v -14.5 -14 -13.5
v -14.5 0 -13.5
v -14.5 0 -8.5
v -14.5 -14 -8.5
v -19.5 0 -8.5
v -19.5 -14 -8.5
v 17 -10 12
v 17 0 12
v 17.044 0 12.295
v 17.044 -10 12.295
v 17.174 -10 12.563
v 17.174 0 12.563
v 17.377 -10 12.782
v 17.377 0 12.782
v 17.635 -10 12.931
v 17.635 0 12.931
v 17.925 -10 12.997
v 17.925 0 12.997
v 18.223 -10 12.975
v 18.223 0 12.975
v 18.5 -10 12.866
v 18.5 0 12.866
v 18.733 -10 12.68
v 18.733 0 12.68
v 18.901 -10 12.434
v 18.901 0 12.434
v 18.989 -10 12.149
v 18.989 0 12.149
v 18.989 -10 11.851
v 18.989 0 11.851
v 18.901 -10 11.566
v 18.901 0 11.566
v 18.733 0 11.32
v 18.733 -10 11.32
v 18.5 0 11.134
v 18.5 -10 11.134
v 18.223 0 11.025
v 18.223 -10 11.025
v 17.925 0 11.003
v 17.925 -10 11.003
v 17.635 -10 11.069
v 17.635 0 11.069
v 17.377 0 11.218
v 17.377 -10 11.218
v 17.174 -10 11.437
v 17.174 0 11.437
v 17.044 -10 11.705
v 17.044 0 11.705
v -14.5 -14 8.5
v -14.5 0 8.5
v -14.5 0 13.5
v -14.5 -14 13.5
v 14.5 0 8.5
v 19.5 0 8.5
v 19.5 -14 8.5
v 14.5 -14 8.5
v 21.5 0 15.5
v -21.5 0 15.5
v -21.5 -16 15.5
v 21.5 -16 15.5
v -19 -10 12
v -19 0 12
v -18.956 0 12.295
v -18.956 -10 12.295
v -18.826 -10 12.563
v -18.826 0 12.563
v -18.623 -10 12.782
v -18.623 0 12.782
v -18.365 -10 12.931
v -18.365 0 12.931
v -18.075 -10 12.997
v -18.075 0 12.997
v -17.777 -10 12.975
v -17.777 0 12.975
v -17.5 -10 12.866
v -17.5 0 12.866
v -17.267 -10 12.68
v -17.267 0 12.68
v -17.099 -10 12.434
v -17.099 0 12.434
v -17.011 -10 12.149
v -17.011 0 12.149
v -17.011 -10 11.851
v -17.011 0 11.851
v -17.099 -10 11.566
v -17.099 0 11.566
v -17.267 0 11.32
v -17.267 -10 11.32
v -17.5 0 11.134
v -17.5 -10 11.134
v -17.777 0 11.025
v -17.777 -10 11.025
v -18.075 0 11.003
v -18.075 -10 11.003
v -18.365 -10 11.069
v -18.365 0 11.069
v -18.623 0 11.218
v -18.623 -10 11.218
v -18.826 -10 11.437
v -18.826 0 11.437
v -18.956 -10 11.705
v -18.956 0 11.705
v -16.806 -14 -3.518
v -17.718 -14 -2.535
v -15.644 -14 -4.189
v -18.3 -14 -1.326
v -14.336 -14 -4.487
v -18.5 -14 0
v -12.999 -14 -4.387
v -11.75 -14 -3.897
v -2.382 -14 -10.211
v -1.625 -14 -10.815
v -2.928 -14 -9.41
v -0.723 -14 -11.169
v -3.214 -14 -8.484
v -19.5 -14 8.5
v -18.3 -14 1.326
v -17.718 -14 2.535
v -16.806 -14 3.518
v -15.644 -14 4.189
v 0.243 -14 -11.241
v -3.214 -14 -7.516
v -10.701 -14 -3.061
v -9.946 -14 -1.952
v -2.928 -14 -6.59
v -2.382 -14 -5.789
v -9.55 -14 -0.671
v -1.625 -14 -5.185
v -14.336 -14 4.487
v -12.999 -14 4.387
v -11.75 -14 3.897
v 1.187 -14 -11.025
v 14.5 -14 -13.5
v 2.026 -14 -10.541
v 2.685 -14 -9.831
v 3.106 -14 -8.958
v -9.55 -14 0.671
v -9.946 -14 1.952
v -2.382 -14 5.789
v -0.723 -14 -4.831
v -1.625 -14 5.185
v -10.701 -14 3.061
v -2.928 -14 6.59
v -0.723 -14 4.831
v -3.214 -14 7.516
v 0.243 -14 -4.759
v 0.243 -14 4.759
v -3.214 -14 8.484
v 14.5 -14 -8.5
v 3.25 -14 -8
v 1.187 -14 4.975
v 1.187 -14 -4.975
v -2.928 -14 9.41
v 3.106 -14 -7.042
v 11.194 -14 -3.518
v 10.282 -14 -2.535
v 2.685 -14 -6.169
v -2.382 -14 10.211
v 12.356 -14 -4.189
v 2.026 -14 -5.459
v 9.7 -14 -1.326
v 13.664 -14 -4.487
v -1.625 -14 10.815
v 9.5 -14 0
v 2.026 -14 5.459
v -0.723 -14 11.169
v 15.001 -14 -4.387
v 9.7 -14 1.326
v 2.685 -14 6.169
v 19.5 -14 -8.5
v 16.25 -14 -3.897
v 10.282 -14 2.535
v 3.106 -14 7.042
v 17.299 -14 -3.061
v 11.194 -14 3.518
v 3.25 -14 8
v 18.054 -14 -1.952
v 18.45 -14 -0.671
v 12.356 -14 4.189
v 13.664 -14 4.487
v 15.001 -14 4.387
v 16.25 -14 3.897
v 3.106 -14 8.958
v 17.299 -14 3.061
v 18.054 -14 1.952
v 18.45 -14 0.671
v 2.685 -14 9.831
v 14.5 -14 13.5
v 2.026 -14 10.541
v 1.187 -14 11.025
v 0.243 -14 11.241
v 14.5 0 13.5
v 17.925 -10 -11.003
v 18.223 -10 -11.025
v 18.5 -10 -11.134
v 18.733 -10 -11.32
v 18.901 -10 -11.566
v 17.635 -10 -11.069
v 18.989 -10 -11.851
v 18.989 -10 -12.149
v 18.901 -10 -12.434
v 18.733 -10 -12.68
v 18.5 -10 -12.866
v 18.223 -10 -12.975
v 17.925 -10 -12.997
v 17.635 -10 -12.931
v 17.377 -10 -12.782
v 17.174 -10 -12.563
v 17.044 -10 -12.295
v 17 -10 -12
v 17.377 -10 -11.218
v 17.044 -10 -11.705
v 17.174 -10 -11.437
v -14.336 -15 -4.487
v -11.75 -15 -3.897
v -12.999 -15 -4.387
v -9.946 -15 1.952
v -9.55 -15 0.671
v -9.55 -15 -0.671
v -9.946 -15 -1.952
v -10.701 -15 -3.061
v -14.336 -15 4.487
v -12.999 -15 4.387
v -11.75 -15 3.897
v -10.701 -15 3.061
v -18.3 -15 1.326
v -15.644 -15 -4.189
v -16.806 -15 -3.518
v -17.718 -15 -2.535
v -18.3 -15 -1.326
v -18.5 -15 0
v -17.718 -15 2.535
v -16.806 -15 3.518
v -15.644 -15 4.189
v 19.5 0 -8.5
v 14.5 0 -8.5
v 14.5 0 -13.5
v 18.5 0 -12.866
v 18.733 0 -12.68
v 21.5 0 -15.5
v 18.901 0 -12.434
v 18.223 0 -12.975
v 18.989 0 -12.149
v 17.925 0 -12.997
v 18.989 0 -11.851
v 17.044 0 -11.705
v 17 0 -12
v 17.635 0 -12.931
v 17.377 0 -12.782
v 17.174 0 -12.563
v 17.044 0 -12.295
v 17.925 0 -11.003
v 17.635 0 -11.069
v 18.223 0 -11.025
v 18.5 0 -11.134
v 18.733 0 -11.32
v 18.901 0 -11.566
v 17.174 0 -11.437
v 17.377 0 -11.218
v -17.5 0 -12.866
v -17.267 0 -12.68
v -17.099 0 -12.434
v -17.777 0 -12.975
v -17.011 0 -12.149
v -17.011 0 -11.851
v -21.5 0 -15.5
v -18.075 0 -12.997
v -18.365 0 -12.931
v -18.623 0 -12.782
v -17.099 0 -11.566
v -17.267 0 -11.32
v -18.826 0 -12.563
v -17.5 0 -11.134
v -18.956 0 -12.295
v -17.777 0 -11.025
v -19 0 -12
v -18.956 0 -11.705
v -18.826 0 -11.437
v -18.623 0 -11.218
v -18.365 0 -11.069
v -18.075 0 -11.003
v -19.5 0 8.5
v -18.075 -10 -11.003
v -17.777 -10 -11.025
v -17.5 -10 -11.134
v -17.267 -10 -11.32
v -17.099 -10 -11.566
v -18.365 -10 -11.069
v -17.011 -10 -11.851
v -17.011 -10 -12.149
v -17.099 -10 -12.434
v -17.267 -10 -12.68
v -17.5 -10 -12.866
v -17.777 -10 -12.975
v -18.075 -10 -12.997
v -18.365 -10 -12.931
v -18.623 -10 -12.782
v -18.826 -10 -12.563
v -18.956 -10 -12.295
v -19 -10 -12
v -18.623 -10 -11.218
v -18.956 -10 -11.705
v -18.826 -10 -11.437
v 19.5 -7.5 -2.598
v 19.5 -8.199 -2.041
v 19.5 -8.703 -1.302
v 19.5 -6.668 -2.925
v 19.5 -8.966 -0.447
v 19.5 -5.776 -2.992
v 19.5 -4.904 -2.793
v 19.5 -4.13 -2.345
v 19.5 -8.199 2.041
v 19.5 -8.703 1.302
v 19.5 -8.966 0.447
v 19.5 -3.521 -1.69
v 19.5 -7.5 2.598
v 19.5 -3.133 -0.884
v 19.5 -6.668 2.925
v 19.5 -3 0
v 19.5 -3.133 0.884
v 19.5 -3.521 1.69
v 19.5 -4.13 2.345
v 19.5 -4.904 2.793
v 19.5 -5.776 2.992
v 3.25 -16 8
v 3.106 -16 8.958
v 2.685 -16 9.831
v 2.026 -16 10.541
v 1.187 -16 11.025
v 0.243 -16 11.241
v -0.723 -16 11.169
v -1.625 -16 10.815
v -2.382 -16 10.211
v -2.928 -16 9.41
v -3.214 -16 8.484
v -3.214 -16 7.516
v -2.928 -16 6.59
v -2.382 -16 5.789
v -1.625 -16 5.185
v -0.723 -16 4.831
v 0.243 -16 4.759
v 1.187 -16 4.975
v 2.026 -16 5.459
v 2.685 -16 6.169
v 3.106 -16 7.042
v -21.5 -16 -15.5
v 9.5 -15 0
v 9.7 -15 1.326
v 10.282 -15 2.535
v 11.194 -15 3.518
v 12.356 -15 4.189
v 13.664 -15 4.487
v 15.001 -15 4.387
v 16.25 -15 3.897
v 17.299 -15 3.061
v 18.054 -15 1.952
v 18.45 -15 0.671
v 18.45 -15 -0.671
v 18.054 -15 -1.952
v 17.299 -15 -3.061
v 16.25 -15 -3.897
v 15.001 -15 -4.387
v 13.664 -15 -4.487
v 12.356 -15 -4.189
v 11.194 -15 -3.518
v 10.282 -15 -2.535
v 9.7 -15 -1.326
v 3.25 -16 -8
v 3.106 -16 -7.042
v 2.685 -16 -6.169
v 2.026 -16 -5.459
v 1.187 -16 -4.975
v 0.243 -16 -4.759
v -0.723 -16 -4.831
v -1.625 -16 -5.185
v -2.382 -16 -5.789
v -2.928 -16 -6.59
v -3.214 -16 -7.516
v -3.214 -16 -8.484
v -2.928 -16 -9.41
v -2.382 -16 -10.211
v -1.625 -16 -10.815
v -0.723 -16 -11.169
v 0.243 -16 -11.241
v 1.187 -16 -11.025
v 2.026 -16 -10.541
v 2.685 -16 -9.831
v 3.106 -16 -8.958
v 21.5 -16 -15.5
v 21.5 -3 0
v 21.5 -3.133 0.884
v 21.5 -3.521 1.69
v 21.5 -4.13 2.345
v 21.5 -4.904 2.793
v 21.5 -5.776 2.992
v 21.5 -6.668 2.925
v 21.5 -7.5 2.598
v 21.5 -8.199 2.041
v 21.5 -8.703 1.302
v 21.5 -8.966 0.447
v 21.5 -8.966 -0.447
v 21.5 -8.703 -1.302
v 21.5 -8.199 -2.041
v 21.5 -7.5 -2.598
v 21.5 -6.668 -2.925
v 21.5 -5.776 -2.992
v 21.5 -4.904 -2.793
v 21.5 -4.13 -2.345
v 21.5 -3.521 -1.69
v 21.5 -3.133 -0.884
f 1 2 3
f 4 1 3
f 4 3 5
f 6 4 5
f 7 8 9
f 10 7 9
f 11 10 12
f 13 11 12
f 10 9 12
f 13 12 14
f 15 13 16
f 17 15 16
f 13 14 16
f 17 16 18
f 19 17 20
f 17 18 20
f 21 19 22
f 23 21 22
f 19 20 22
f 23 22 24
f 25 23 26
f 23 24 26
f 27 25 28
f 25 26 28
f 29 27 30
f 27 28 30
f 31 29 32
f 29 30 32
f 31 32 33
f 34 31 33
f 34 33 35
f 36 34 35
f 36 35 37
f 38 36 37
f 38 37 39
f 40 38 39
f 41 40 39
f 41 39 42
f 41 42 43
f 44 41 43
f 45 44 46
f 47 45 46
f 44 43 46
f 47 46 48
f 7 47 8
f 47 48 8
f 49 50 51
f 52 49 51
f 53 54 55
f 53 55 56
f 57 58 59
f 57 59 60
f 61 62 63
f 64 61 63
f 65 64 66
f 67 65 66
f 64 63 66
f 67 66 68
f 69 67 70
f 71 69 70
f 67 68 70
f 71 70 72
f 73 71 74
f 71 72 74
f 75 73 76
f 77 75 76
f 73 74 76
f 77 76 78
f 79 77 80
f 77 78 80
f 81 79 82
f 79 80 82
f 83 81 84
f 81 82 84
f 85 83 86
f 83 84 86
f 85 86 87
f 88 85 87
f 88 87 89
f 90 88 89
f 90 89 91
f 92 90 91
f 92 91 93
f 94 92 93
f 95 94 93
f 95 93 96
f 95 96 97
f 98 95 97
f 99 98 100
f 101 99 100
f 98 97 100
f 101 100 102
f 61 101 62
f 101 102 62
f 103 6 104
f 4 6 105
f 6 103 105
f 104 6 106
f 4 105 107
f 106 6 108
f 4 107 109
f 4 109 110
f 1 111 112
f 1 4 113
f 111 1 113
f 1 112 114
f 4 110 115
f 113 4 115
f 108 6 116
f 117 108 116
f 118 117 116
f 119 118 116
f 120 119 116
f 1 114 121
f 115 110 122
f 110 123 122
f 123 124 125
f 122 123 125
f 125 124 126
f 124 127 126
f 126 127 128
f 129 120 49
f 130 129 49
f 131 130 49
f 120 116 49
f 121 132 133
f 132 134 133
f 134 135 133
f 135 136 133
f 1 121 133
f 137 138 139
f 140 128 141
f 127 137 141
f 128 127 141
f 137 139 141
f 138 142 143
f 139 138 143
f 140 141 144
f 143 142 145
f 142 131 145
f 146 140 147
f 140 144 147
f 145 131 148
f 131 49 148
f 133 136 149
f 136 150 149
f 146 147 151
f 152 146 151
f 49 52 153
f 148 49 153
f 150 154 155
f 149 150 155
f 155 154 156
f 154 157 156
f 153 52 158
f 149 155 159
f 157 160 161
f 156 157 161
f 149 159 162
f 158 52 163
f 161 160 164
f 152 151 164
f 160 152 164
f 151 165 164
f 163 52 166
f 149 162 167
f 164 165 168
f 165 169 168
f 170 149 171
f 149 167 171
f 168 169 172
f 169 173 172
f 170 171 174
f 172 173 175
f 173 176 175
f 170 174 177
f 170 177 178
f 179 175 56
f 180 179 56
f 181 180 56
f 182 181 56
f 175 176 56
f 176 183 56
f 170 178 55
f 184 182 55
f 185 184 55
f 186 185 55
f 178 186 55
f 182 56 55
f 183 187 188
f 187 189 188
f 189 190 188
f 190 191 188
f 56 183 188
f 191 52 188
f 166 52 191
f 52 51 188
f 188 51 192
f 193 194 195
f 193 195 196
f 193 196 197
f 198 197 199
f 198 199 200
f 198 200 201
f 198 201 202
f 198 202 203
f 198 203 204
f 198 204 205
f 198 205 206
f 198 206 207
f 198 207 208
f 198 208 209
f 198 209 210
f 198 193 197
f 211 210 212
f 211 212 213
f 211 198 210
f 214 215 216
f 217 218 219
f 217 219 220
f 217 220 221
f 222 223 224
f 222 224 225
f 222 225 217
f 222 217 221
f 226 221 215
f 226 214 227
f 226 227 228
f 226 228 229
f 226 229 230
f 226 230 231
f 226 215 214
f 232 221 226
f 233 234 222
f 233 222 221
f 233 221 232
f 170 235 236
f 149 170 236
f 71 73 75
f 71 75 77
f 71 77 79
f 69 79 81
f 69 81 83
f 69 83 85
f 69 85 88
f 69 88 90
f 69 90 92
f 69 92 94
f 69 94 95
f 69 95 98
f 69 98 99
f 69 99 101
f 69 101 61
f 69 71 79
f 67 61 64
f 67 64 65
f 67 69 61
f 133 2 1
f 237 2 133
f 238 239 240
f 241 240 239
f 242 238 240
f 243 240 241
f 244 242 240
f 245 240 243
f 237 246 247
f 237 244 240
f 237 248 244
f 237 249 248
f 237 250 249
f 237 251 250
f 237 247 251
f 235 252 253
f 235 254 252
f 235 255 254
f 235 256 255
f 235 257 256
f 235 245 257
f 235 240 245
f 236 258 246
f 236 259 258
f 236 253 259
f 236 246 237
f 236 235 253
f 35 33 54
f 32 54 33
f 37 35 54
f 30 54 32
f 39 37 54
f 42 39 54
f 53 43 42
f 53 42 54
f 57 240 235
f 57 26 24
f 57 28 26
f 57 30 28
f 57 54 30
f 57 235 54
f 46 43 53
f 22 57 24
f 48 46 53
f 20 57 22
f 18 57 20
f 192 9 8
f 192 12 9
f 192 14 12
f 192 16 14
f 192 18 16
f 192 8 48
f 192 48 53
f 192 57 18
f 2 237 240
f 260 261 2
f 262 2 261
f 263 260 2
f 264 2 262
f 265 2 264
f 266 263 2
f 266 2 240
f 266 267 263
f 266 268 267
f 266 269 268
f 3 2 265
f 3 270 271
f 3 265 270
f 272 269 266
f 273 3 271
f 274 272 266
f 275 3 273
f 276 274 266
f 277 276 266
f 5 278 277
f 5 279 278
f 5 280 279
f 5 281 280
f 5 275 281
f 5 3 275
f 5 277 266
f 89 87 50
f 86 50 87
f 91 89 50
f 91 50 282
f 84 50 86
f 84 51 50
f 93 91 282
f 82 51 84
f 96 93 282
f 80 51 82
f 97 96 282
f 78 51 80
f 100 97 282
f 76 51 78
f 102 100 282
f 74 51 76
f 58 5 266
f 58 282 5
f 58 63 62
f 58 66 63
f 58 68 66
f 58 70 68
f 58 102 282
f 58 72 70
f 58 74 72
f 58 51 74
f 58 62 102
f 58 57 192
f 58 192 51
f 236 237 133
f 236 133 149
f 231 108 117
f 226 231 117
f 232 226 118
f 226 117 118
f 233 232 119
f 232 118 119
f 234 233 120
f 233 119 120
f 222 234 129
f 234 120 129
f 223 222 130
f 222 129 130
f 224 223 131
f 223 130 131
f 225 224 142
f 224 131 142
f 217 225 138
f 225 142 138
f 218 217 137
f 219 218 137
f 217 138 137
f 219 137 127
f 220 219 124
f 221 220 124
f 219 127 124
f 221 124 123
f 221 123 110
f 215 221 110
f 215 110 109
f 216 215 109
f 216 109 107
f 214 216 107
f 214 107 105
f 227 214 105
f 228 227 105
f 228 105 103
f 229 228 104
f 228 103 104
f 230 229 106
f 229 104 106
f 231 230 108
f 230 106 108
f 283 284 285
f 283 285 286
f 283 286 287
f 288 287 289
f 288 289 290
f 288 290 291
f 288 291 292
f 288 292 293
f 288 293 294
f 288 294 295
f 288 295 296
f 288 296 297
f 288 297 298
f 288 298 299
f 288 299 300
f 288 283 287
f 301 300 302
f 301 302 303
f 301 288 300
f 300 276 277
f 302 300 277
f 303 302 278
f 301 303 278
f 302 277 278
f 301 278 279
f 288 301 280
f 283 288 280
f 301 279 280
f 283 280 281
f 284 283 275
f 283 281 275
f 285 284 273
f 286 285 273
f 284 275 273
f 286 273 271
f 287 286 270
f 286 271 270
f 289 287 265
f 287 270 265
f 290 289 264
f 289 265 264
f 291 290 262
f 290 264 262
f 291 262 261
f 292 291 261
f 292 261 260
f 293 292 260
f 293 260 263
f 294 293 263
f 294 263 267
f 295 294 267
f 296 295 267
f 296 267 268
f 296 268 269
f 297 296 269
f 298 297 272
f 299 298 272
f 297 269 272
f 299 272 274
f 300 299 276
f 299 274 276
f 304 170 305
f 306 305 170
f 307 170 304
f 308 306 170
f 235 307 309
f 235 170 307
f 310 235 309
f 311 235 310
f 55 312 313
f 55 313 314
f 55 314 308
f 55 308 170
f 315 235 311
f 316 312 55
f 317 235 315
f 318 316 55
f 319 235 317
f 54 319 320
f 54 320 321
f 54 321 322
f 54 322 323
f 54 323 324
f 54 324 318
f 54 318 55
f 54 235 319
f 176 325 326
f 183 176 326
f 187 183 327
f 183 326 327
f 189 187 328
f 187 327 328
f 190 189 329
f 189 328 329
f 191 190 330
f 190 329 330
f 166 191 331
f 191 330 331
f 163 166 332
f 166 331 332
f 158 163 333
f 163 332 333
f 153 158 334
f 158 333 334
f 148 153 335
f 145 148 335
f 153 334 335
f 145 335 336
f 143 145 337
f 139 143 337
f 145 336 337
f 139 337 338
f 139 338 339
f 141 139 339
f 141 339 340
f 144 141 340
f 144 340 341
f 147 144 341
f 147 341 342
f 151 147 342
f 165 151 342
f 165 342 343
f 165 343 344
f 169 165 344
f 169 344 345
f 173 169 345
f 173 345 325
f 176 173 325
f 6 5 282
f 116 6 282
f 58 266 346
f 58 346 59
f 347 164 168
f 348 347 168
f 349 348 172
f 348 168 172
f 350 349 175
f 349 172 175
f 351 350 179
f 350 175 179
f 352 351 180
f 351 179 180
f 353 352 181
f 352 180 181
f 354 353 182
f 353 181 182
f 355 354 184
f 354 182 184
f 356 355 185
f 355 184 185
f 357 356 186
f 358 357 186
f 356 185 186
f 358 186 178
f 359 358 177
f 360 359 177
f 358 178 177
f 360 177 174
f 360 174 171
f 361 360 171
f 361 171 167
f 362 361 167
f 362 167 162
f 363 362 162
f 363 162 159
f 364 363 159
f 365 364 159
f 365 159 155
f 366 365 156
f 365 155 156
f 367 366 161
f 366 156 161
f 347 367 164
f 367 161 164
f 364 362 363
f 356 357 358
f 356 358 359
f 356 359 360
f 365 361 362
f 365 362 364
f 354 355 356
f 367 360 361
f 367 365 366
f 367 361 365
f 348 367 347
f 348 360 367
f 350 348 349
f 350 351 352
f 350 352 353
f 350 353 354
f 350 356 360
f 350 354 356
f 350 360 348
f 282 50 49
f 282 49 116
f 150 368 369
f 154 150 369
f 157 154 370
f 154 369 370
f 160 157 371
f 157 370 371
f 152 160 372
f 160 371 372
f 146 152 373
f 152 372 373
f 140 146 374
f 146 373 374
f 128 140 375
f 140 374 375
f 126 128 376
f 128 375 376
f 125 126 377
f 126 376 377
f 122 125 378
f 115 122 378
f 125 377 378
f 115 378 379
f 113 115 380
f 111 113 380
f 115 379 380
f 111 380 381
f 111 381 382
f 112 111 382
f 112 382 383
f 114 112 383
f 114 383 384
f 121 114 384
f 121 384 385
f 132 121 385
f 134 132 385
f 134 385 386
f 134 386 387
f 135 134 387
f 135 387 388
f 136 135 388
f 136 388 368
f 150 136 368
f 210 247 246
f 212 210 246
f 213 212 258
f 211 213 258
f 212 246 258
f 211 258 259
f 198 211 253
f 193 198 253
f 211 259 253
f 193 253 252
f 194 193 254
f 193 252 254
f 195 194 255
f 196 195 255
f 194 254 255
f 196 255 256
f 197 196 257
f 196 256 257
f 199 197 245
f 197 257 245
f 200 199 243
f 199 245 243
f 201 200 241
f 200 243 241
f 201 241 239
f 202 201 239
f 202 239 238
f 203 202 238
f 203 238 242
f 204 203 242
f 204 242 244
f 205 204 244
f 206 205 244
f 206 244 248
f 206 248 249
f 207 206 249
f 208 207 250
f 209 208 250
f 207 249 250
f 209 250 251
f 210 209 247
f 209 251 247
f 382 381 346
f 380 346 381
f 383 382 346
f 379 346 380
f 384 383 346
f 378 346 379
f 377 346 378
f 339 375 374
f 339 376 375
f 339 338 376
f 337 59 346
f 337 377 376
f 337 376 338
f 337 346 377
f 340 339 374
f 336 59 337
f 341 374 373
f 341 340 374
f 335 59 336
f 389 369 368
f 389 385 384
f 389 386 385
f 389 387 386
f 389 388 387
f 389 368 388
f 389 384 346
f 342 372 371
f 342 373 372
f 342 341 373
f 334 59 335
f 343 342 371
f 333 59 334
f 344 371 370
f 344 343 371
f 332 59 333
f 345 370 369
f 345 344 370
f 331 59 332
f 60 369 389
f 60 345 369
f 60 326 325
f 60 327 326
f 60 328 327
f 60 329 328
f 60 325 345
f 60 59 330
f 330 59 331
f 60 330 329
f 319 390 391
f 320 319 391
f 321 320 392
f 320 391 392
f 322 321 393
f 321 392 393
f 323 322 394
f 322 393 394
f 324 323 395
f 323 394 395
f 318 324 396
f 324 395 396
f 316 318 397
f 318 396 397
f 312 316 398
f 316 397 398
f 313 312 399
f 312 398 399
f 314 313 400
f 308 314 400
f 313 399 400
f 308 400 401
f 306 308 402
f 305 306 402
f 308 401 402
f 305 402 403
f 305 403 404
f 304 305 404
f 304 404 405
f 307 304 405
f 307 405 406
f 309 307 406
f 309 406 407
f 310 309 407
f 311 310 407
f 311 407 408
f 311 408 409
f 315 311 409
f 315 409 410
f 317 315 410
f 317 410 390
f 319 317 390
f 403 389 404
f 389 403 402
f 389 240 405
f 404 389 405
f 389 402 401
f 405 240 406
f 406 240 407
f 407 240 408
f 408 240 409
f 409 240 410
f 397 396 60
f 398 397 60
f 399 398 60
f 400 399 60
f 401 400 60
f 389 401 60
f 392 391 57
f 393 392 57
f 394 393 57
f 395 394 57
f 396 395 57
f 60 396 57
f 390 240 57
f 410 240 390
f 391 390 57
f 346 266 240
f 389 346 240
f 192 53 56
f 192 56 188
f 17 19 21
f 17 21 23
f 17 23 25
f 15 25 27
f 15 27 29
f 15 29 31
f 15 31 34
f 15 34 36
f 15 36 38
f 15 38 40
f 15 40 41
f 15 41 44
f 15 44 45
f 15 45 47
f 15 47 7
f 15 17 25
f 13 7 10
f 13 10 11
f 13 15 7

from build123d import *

# Parameters (mm, degrees)
F0_W      = 43
F0_H      = 31
F1_DEPTH  = 16
F2_T      = -2
F3_R      = 3.25
F4_DEPTH  = 16.001
F5_R      = 3
F6_DEPTH  = 7.6
F7_W      = 5
F7_H      = 5
F8_DEPTH  = 14
F9_W      = 5
F9_H      = 5
F10_DEPTH = 14
F12_R     = 1
F13_DEPTH = 10
F14_R     = 4.5
F15_DEPTH = 1


with BuildPart() as f1:
    # F0 (on Front) → F1 (new body)
    with BuildSketch(Plane.XZ):
        Rectangle(F0_W, F0_H)
    extrude(amount=F1_DEPTH)

    # F2
    f2_openings = [f1.faces().sort_by_distance(p)[0] for p in [
        (0, 0, 0),
    ]]
    offset(amount=F2_T, openings=f2_openings)

    # F3 (on face) → F4 (cut, through all)
    with BuildSketch(Plane.XZ.offset(16)):
        with Locations((0, 8)):
            Circle(F3_R)
        with Locations((0, -8)):
            Circle(F3_R)
    extrude(amount=-F4_DEPTH, mode=Mode.SUBTRACT)

    # F5 (on face) → F6 (cut)
    with BuildSketch(Plane.YZ.offset(21.5)):
        with Locations((-6, 0)):
            Circle(F5_R)
    extrude(amount=-F6_DEPTH, mode=Mode.SUBTRACT)

    # F7 (on face) → F8 (join, through all)
    with BuildSketch(Plane(origin=(0, 0, 0), x_dir=(-1, 0, 0), z_dir=(0, 1, 0))):
        with Locations((17, 11)):
            Rectangle(F7_W, F7_H)
    extrude(amount=-F8_DEPTH)


with BuildPart() as f10:
    # F9 (on face) → F10 (new body, through all)
    with BuildSketch(Plane(origin=(0, 0, 0), x_dir=(-1, 0, 0), z_dir=(0, 1, 0))):
        with Locations((17, -11)):
            Rectangle(F9_W, F9_H)
        with Locations((-17, -11)):
            Rectangle(F9_W, F9_H)
        with Locations((-17, 11)):
            Rectangle(F9_W, F9_H)
    extrude(amount=-F10_DEPTH)


with BuildPart() as f1_1:
    add(f1.part)

    # F11: union F10
    add(f10.part)

    # F12 (on face) → F13 (cut)
    with BuildSketch(Plane(origin=(0, 0, 0), x_dir=(-1, 0, 0), z_dir=(0, 1, 0))):
        with Locations((18, 12)):
            Circle(F12_R)
        with Locations((18, -12)):
            Circle(F12_R)
        with Locations((-18, 12)):
            Circle(F12_R)
        with Locations((-18, -12)):
            Circle(F12_R)
    extrude(amount=-F13_DEPTH, mode=Mode.SUBTRACT)

    # F14 (on face) → F15 (cut)
    with BuildSketch(Plane(origin=(0, -14, 0), x_dir=(-1, 0, 0), z_dir=(0, 1, 0))):
        with Locations((-14, 0)):
            Circle(F14_R)
        with Locations((14, 0)):
            Circle(F14_R)
    extrude(amount=-F15_DEPTH, mode=Mode.SUBTRACT)


solid = f1_1.part
